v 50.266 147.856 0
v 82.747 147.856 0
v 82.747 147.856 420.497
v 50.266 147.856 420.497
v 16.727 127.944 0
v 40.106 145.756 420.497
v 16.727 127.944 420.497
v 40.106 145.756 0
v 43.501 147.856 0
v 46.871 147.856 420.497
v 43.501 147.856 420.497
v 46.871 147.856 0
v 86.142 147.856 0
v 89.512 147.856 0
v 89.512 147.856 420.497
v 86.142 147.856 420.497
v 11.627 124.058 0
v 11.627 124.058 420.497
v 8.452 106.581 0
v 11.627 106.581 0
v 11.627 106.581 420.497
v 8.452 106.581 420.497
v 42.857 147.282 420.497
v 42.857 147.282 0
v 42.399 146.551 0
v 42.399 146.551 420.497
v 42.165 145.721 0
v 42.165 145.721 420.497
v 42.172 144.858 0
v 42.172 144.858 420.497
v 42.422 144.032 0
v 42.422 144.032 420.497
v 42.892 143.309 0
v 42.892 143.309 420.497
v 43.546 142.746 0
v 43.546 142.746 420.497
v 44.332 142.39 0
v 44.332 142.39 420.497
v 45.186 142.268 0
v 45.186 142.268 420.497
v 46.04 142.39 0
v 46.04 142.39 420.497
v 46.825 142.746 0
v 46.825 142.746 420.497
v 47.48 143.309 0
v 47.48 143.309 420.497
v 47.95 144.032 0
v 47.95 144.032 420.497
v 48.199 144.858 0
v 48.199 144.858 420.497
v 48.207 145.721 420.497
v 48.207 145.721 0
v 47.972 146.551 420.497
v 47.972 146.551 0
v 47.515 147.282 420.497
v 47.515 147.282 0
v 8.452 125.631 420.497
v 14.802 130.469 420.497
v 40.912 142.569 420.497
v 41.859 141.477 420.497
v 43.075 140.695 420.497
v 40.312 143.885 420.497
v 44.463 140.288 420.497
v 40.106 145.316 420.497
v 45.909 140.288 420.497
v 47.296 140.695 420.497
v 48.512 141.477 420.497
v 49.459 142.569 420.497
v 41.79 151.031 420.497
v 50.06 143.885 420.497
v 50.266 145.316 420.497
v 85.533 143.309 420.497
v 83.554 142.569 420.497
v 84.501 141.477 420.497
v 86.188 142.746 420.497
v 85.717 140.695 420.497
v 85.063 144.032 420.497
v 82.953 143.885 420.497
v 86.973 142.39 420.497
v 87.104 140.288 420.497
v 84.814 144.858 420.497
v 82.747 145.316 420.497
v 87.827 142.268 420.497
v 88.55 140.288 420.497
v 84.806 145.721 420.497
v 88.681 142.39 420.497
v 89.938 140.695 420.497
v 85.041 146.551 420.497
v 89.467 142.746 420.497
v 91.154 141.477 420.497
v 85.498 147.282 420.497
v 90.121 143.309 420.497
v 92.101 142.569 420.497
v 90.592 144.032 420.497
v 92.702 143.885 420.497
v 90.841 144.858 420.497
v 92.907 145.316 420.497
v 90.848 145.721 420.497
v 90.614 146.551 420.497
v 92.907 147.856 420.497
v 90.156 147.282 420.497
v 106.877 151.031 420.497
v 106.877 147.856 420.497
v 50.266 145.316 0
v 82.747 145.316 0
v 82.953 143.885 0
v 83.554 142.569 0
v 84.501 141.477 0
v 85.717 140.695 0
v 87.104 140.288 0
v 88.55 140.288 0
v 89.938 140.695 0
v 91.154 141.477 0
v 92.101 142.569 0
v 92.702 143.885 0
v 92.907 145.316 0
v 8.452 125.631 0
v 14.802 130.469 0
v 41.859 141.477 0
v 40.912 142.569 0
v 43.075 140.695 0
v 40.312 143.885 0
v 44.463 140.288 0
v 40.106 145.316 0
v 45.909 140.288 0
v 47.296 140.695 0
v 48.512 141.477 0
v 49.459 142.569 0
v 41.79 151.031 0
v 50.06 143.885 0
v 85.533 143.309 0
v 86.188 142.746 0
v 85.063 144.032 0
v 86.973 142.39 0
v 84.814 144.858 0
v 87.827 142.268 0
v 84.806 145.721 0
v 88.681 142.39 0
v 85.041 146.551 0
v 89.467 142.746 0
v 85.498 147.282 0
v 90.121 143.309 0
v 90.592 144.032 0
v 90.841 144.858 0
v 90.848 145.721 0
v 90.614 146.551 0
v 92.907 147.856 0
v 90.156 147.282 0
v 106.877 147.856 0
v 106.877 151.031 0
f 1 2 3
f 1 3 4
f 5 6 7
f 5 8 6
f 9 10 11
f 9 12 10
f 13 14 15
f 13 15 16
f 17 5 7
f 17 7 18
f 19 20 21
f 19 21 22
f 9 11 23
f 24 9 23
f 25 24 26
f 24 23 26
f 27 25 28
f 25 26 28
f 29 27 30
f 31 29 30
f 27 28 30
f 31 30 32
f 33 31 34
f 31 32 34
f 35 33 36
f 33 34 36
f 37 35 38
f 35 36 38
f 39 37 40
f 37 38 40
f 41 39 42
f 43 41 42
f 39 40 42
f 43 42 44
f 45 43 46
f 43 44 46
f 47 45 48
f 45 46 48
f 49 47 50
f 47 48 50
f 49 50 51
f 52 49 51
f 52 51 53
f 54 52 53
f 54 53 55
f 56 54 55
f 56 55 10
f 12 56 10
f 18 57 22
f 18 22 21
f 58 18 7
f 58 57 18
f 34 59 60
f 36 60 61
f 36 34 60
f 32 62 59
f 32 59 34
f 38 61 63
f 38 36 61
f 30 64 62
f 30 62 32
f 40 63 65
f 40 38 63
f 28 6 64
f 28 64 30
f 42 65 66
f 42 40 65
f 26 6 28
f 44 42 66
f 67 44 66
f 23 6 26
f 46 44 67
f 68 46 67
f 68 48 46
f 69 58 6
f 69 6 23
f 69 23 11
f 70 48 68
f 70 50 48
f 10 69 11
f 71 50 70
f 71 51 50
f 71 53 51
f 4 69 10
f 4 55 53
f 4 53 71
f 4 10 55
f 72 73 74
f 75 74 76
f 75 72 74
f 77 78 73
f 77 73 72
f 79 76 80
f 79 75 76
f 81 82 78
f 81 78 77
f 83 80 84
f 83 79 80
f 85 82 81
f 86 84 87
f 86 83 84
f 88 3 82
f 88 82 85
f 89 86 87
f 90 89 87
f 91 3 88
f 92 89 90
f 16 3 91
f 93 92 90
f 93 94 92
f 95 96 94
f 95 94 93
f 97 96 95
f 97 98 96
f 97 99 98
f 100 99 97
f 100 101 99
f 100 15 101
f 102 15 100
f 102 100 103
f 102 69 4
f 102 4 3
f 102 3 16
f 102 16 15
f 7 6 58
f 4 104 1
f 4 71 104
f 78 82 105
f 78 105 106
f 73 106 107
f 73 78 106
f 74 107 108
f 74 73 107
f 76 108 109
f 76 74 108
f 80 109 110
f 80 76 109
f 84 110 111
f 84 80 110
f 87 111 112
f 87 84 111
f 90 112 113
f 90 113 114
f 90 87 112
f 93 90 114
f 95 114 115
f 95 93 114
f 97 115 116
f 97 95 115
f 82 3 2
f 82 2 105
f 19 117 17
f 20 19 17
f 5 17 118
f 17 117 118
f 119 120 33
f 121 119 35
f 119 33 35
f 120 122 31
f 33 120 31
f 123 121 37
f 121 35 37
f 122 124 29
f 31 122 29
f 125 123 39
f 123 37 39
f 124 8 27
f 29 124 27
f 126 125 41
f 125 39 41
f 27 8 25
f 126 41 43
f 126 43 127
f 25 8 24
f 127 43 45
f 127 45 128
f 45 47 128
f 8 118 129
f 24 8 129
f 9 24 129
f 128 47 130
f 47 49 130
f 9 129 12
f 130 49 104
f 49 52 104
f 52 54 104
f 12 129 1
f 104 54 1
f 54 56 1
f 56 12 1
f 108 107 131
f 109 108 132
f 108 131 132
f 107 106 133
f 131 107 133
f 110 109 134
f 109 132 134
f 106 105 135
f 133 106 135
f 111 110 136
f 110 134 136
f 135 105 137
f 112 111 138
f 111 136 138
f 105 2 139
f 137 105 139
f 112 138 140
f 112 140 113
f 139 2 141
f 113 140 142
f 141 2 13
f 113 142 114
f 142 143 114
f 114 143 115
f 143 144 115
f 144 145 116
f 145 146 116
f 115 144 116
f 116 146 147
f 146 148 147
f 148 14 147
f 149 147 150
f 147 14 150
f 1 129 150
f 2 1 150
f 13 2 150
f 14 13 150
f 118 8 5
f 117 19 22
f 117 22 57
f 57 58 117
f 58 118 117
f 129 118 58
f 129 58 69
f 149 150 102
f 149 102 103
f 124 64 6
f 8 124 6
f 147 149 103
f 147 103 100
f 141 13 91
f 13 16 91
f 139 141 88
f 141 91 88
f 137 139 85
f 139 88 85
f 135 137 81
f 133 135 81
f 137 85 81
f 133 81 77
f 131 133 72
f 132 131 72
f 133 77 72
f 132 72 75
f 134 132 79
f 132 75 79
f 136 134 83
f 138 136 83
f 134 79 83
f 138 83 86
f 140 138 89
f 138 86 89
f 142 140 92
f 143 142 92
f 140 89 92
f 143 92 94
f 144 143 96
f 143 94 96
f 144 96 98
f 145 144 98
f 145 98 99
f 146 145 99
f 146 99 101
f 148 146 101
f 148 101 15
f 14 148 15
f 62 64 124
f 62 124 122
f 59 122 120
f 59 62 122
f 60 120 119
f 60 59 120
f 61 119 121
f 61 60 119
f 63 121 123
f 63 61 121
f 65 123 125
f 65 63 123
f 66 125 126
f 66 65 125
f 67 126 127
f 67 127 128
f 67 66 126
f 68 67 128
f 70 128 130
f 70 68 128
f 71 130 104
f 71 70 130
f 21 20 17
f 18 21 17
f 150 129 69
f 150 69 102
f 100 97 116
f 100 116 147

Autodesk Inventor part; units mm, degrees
ref_plane "YZ Plane" through (0, 0, 0) normal (1, 0, 0) x (0, 1, 0)
ref_plane "XZ Plane" through (0, 0, 0) normal (0, 1, 0) x (-1, 0, 0)
ref_plane "Work Plane1" through (0, -383.0536, 0) normal (0, 0, 1) x (1, 0, 0)
sketch "Sketch1" plane through (0, -383.0536, 0) normal (0, 0, 1) x (1, 0, 0)
  line L0 (41.7899, 534.0845) -> (106.8774, 534.0845) projected
  line L1 (14.8024, 513.5226) -> (41.7899, 534.0845) projected
  line L2 (106.8774, 530.9095) -> (42.8616, 530.9095)
  line L3 (42.8616, 530.9095) -> (16.7266, 510.9971)
  line L4 (106.8774, 534.0845) -> (106.8774, 530.9095)
  line L5 (11.6274, 489.6345) -> (11.6274, 207.8533) projected
  line L6 (16.7266, 510.9971) -> (11.6274, 507.112)
  line L7 (14.8024, 513.5226) -> (8.4524, 508.6845)
  line L8 (11.6274, 489.6345) -> (11.6274, 507.112)
  line L9 (11.6274, 489.6345) -> (11.6274, 207.8533) projected
  line L10 (8.4524, 489.6345) -> (8.4524, 207.8533) projected
  line L11 (11.6274, 489.6345) -> (8.4524, 489.6345) projected
  line L12 (8.4524, 489.6345) -> (8.4524, 508.6845)
  point P0 (0, 383.0536)
  dimension "d0" = 3.175
extrude "Extrusion1" add sketch "Sketch1" along normal blind 420.497
sketch "Sketch2" plane through (0, -383.0536, 420.497) normal (0, 0, 1) x (1, 0, 0)
  line L0 (42.8616, 530.9095) -> (106.8774, 530.9095) projected
  line L1 (92.9074, 530.9095) -> (82.7474, 530.9095)
  arc A0 (82.7474, 528.3695) -> (92.9074, 528.3695) centre (87.8274, 528.3695) ccw
  line L2 (106.8774, 534.0845) -> (41.7899, 534.0845) projected
  arc A1 (89.5122, 530.9095) -> (86.1425, 530.9095) centre (87.8274, 528.3695) ccw
  line L3 (92.9074, 528.3695) -> (92.9074, 530.9095)
  line L4 (82.7474, 530.9095) -> (82.7474, 528.3695)
  arc A2 (83.428, 530.9095) -> (82.7474, 528.3695) centre (87.8274, 528.3695) ccw construction
  arc A3 (92.2268, 530.9095) -> (83.428, 530.9095) centre (87.8274, 528.3695) ccw
  arc A4 (92.9074, 528.3695) -> (92.2268, 530.9095) centre (87.8274, 528.3695) ccw construction
  arc A5 (86.1425, 530.9095) -> (89.5122, 530.9095) centre (87.8274, 528.3695) ccw
  line L5 (41.1835, 533.6226) -> (43.2506, 530.9095)
  line L6 (14.8024, 513.5226) -> (41.7899, 534.0845) projected
  arc A6 (40.1058, 528.3695) -> (50.2658, 528.3695) centre (45.1858, 528.3695) ccw
  arc A7 (43.501, 530.9095) -> (46.8707, 530.9095) centre (45.1858, 528.3695) ccw
  line L7 (50.2658, 528.3695) -> (50.2658, 530.9095)
  line L8 (11.6274, 507.112) -> (42.8616, 530.9095) projected
  line L9 (40.1058, 528.3695) -> (40.1058, 528.8099)
  line L10 (43.2506, 530.9095) -> (43.3386, 530.794) construction
  arc A8 (40.1264, 528.8256) -> (40.1058, 528.3695) centre (45.1858, 528.3695) ccw construction
  arc A9 (49.5853, 530.9095) -> (40.1264, 528.8256) centre (45.1858, 528.3695) ccw
  arc A10 (50.2658, 528.3695) -> (49.5853, 530.9095) centre (45.1858, 528.3695) ccw construction
  arc A11 (46.8707, 530.9095) -> (43.501, 530.9095) centre (45.1858, 528.3695) ccw
  point P0 (0, 383.0536)
  dimension "d3" = 10.16
  dimension "d4" = 13.97
  dimension "d5" = 10.16
  dimension "d8" = 6.096
  dimension "d9" = 5.715
  dimension "d10" = 3.556
  dimension "d11" = 10.16
  dimension "d12" = 6.096
  dimension "d13" = 5.715
extrude "Extrusion2" add sketch "Sketch2" against normal up to surface (420.497 mm away) contours L0 A7 L7 A6 L9 L8 | L0 A5 L3 A0 L4
properties part number "DriveBaseFront"
